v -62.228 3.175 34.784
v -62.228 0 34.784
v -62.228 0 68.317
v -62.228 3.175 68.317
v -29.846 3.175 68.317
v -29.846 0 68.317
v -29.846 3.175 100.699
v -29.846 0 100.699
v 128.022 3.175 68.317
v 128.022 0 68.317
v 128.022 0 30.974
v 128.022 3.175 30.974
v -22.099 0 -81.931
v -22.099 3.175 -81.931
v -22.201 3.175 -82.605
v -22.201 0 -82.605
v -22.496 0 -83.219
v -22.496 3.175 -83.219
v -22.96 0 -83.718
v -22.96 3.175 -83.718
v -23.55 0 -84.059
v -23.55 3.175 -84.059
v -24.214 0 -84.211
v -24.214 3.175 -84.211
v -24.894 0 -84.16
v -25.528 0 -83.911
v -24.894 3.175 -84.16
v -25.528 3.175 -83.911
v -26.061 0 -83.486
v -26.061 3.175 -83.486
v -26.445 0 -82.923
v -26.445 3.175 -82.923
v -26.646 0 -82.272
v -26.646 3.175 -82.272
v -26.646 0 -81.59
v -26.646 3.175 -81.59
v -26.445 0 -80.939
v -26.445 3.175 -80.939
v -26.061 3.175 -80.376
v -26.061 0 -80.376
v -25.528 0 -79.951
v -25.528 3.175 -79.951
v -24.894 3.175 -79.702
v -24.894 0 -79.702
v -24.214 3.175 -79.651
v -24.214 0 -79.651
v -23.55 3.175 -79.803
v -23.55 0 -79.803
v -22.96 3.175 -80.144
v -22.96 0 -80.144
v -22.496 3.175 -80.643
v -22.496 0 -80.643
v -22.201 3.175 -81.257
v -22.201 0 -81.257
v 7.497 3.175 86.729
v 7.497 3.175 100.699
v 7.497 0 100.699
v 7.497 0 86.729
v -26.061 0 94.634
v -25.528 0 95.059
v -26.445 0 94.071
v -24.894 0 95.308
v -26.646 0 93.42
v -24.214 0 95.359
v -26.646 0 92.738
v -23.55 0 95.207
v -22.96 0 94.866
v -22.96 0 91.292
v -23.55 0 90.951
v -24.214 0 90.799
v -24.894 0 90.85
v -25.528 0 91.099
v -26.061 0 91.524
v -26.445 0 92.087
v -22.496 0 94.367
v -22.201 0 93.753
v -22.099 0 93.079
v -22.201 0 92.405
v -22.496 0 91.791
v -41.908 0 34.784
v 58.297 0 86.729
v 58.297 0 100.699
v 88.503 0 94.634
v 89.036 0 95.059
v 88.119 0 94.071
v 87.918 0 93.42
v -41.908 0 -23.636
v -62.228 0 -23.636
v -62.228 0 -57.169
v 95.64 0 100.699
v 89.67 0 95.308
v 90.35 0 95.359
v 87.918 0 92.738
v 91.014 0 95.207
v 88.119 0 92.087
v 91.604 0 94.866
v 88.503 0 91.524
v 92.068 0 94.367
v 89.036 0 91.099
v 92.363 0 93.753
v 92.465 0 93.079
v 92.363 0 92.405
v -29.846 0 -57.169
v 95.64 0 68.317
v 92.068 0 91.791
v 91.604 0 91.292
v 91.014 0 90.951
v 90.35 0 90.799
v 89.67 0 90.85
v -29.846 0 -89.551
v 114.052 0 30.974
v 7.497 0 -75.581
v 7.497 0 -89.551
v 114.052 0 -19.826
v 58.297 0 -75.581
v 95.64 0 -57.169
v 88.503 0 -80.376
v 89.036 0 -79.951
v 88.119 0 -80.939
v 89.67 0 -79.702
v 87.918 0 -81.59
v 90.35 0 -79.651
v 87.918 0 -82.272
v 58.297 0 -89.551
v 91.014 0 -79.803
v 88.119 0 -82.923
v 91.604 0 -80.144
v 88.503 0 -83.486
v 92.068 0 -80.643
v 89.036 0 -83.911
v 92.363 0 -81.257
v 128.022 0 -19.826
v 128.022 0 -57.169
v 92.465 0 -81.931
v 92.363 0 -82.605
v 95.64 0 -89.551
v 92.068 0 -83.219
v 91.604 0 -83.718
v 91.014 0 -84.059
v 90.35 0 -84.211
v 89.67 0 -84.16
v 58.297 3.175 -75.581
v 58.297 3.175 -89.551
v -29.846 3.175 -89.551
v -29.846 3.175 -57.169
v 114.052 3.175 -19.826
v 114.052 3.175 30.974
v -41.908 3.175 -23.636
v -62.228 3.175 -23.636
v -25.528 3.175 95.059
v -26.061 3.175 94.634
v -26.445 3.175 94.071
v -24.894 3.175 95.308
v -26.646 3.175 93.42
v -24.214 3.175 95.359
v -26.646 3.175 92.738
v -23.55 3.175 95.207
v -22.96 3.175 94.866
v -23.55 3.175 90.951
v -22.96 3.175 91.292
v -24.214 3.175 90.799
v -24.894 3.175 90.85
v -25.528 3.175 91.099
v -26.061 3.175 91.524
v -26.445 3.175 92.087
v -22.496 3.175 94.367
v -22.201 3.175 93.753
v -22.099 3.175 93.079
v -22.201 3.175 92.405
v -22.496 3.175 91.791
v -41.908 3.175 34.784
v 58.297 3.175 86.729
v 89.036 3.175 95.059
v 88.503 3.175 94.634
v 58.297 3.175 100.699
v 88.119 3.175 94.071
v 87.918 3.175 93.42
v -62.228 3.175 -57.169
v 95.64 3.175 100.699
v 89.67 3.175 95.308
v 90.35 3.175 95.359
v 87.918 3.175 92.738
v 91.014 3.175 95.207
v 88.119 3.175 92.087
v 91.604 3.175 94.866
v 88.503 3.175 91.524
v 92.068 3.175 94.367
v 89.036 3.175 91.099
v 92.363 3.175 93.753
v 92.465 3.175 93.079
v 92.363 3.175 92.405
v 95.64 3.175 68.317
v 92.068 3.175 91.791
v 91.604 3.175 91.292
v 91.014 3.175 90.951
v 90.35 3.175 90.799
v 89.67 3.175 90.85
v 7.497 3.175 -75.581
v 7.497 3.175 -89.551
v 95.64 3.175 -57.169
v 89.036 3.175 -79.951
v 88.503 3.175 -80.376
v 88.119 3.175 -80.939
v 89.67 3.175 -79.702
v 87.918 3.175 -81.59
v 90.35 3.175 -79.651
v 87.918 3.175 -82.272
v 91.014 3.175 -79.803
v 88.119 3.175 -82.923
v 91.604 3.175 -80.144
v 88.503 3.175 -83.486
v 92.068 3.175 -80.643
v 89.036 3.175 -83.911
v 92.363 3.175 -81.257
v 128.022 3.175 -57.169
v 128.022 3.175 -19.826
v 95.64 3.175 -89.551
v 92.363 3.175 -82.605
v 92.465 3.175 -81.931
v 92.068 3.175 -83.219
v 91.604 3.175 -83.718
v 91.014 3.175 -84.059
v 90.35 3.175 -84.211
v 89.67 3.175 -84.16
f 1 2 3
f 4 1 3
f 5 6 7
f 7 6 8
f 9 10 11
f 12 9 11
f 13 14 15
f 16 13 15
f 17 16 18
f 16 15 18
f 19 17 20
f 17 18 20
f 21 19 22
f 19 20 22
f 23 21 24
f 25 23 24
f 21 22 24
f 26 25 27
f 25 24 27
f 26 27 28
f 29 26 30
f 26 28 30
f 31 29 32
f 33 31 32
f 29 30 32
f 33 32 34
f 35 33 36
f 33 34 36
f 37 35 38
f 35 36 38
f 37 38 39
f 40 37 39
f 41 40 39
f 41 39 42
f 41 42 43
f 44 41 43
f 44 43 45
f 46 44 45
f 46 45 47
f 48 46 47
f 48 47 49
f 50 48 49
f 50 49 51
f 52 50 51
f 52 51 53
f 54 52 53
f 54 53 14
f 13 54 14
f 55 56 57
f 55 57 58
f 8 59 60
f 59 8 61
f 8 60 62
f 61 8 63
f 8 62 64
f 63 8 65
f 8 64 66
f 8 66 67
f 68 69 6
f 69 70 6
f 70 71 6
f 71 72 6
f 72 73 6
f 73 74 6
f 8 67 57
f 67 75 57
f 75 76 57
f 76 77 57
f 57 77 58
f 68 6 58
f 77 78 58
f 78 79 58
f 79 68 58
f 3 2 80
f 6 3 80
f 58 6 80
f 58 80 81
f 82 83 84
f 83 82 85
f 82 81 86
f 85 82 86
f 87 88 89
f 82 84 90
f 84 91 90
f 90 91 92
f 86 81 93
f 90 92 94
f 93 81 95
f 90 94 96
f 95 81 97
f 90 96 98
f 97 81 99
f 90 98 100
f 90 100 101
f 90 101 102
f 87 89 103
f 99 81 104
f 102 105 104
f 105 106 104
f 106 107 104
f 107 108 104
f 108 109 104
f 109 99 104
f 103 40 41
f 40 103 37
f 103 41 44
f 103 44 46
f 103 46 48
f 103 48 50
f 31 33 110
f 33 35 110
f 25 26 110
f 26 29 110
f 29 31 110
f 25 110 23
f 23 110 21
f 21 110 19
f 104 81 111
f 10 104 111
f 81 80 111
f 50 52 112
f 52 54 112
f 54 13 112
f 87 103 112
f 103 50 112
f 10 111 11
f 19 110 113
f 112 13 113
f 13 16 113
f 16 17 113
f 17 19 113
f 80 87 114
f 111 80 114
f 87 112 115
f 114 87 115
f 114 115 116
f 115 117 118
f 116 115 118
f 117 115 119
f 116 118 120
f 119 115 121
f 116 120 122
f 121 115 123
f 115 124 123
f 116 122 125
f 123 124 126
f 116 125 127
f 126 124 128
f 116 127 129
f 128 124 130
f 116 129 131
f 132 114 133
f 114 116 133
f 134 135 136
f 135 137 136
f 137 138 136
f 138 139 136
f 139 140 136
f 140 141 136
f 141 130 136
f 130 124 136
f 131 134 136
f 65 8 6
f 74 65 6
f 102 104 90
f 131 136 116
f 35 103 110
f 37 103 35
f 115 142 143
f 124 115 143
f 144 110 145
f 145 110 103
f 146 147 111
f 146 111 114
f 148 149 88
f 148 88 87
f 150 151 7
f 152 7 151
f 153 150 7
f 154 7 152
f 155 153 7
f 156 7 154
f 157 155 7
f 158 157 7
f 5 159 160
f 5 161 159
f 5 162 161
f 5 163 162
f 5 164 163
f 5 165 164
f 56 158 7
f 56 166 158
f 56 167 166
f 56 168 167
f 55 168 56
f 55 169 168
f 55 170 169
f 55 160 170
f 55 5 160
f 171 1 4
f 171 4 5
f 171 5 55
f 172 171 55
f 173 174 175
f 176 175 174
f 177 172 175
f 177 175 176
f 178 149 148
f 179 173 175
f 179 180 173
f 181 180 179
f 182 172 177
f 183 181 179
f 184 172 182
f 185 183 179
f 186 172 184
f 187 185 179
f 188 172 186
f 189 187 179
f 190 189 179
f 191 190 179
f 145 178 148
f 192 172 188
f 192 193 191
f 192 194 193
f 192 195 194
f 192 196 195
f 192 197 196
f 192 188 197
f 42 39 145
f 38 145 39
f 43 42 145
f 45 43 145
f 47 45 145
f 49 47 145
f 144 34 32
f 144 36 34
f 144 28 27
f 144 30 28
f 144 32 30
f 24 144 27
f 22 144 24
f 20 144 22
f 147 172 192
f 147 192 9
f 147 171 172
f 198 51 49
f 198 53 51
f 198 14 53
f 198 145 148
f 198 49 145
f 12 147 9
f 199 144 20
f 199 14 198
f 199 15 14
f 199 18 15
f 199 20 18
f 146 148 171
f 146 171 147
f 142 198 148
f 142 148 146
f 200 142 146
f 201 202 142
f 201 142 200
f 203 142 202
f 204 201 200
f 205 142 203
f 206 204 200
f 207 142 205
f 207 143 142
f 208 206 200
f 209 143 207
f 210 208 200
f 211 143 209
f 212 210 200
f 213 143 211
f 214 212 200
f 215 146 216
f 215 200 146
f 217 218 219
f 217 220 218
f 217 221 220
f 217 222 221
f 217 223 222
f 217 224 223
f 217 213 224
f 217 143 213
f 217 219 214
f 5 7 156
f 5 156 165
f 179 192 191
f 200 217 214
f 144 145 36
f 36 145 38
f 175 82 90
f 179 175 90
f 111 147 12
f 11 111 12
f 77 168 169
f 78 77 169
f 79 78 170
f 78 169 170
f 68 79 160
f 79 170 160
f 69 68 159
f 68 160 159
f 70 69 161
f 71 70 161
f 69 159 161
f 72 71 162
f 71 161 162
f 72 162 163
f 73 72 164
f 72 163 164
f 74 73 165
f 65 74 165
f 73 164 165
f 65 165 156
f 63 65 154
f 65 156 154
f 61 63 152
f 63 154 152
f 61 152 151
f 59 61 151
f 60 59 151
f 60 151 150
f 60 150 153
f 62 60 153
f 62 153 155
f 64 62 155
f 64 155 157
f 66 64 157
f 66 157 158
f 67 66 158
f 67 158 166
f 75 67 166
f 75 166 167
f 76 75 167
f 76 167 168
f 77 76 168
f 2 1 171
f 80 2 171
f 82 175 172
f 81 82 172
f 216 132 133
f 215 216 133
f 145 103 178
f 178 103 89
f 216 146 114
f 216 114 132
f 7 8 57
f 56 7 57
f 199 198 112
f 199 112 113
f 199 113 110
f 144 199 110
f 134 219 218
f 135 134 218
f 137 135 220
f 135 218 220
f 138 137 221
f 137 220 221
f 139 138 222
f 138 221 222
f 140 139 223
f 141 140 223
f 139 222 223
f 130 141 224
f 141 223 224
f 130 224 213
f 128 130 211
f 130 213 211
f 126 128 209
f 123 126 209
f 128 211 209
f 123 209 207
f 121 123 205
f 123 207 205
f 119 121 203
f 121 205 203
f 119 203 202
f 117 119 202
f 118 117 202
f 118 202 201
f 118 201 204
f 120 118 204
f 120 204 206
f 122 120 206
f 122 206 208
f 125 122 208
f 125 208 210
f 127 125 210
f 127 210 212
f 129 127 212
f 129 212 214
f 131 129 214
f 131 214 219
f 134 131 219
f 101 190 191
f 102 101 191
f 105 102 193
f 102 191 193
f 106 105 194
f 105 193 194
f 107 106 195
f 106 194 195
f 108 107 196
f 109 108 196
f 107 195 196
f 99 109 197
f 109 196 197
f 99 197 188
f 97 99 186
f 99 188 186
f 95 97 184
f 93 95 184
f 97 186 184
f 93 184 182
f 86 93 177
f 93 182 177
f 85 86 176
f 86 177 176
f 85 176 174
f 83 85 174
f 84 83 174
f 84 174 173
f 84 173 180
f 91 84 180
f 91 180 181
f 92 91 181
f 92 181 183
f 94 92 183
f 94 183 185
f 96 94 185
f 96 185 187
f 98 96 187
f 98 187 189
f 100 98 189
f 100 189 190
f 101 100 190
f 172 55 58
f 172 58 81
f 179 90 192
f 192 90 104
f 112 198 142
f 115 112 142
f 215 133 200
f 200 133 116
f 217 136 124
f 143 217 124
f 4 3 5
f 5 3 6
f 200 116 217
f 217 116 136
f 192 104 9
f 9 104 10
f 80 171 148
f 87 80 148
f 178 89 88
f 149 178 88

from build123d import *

# Parameters (mm, degrees)
BOSS_EXTRUDE1_DEPTH = 3.175
SKETCH2_R           = 2.286
CUT_EXTRUDE1_DEPTH  = 4.175
SKETCH3_W           = 20.32
SKETCH3_H           = 58.42
SKETCH3_W_2         = 50.8
SKETCH3_H_2         = 13.97
SKETCH3_W_3         = 13.97
SKETCH3_H_3         = 50.8
CUT_EXTRUDE2_DEPTH  = 4.175


with BuildPart() as part:
    # Sketch1 → Boss-Extrude1 (new body)
    with BuildSketch(Plane(origin=(0, 0, 0), x_dir=(1, 0, 0), z_dir=(0, 1, 0))):
        Polygon((-62.22816, -68.31704), (-29.84616, -68.31704), (-29.84616, -100.69904), (95.63984, -100.69904), (95.63984, -68.31704), (128.02184, -68.31704), (128.02184, 57.16896), (95.63984, 57.16896), (95.63984, 89.55096), (-29.84616, 89.55096), (-29.84616, 57.16896), (-62.22816, 57.16896), align=None)
    extrude(amount=BOSS_EXTRUDE1_DEPTH)

    # Sketch2 → Cut-Extrude1 (cut, through all)
    with BuildSketch(Plane(origin=(0, 3.175, 0), x_dir=(1, 0, 0), z_dir=(0, 1, 0))):
        with Locations((-24.38516, 81.93096)):
            Circle(SKETCH2_R)
        with Locations((90.17884, 81.93096)):
            Circle(SKETCH2_R)
        with Locations((90.17884, -93.07904)):
            Circle(SKETCH2_R)
        with Locations((-24.38516, -93.07904)):
            Circle(SKETCH2_R)
    extrude(amount=-CUT_EXTRUDE1_DEPTH, mode=Mode.SUBTRACT)

    # Sketch3 → Cut-Extrude2 (cut, through all)
    with BuildSketch(Plane(origin=(0, 3.175, 0), x_dir=(1, 0, 0), z_dir=(0, 1, 0))):
        with Locations((-52.06816, -5.57404)):
            Rectangle(SKETCH3_W, SKETCH3_H)
        with Locations((32.89684, 82.56596)):
            Rectangle(SKETCH3_W_2, SKETCH3_H_2)
        with Locations((121.03684, -5.57404)):
            Rectangle(SKETCH3_W_3, SKETCH3_H_3)
        with Locations((32.89684, -93.71404)):
            Rectangle(SKETCH3_W_2, SKETCH3_H_2)
    extrude(amount=-CUT_EXTRUDE2_DEPTH, mode=Mode.SUBTRACT)


solid = part.part
